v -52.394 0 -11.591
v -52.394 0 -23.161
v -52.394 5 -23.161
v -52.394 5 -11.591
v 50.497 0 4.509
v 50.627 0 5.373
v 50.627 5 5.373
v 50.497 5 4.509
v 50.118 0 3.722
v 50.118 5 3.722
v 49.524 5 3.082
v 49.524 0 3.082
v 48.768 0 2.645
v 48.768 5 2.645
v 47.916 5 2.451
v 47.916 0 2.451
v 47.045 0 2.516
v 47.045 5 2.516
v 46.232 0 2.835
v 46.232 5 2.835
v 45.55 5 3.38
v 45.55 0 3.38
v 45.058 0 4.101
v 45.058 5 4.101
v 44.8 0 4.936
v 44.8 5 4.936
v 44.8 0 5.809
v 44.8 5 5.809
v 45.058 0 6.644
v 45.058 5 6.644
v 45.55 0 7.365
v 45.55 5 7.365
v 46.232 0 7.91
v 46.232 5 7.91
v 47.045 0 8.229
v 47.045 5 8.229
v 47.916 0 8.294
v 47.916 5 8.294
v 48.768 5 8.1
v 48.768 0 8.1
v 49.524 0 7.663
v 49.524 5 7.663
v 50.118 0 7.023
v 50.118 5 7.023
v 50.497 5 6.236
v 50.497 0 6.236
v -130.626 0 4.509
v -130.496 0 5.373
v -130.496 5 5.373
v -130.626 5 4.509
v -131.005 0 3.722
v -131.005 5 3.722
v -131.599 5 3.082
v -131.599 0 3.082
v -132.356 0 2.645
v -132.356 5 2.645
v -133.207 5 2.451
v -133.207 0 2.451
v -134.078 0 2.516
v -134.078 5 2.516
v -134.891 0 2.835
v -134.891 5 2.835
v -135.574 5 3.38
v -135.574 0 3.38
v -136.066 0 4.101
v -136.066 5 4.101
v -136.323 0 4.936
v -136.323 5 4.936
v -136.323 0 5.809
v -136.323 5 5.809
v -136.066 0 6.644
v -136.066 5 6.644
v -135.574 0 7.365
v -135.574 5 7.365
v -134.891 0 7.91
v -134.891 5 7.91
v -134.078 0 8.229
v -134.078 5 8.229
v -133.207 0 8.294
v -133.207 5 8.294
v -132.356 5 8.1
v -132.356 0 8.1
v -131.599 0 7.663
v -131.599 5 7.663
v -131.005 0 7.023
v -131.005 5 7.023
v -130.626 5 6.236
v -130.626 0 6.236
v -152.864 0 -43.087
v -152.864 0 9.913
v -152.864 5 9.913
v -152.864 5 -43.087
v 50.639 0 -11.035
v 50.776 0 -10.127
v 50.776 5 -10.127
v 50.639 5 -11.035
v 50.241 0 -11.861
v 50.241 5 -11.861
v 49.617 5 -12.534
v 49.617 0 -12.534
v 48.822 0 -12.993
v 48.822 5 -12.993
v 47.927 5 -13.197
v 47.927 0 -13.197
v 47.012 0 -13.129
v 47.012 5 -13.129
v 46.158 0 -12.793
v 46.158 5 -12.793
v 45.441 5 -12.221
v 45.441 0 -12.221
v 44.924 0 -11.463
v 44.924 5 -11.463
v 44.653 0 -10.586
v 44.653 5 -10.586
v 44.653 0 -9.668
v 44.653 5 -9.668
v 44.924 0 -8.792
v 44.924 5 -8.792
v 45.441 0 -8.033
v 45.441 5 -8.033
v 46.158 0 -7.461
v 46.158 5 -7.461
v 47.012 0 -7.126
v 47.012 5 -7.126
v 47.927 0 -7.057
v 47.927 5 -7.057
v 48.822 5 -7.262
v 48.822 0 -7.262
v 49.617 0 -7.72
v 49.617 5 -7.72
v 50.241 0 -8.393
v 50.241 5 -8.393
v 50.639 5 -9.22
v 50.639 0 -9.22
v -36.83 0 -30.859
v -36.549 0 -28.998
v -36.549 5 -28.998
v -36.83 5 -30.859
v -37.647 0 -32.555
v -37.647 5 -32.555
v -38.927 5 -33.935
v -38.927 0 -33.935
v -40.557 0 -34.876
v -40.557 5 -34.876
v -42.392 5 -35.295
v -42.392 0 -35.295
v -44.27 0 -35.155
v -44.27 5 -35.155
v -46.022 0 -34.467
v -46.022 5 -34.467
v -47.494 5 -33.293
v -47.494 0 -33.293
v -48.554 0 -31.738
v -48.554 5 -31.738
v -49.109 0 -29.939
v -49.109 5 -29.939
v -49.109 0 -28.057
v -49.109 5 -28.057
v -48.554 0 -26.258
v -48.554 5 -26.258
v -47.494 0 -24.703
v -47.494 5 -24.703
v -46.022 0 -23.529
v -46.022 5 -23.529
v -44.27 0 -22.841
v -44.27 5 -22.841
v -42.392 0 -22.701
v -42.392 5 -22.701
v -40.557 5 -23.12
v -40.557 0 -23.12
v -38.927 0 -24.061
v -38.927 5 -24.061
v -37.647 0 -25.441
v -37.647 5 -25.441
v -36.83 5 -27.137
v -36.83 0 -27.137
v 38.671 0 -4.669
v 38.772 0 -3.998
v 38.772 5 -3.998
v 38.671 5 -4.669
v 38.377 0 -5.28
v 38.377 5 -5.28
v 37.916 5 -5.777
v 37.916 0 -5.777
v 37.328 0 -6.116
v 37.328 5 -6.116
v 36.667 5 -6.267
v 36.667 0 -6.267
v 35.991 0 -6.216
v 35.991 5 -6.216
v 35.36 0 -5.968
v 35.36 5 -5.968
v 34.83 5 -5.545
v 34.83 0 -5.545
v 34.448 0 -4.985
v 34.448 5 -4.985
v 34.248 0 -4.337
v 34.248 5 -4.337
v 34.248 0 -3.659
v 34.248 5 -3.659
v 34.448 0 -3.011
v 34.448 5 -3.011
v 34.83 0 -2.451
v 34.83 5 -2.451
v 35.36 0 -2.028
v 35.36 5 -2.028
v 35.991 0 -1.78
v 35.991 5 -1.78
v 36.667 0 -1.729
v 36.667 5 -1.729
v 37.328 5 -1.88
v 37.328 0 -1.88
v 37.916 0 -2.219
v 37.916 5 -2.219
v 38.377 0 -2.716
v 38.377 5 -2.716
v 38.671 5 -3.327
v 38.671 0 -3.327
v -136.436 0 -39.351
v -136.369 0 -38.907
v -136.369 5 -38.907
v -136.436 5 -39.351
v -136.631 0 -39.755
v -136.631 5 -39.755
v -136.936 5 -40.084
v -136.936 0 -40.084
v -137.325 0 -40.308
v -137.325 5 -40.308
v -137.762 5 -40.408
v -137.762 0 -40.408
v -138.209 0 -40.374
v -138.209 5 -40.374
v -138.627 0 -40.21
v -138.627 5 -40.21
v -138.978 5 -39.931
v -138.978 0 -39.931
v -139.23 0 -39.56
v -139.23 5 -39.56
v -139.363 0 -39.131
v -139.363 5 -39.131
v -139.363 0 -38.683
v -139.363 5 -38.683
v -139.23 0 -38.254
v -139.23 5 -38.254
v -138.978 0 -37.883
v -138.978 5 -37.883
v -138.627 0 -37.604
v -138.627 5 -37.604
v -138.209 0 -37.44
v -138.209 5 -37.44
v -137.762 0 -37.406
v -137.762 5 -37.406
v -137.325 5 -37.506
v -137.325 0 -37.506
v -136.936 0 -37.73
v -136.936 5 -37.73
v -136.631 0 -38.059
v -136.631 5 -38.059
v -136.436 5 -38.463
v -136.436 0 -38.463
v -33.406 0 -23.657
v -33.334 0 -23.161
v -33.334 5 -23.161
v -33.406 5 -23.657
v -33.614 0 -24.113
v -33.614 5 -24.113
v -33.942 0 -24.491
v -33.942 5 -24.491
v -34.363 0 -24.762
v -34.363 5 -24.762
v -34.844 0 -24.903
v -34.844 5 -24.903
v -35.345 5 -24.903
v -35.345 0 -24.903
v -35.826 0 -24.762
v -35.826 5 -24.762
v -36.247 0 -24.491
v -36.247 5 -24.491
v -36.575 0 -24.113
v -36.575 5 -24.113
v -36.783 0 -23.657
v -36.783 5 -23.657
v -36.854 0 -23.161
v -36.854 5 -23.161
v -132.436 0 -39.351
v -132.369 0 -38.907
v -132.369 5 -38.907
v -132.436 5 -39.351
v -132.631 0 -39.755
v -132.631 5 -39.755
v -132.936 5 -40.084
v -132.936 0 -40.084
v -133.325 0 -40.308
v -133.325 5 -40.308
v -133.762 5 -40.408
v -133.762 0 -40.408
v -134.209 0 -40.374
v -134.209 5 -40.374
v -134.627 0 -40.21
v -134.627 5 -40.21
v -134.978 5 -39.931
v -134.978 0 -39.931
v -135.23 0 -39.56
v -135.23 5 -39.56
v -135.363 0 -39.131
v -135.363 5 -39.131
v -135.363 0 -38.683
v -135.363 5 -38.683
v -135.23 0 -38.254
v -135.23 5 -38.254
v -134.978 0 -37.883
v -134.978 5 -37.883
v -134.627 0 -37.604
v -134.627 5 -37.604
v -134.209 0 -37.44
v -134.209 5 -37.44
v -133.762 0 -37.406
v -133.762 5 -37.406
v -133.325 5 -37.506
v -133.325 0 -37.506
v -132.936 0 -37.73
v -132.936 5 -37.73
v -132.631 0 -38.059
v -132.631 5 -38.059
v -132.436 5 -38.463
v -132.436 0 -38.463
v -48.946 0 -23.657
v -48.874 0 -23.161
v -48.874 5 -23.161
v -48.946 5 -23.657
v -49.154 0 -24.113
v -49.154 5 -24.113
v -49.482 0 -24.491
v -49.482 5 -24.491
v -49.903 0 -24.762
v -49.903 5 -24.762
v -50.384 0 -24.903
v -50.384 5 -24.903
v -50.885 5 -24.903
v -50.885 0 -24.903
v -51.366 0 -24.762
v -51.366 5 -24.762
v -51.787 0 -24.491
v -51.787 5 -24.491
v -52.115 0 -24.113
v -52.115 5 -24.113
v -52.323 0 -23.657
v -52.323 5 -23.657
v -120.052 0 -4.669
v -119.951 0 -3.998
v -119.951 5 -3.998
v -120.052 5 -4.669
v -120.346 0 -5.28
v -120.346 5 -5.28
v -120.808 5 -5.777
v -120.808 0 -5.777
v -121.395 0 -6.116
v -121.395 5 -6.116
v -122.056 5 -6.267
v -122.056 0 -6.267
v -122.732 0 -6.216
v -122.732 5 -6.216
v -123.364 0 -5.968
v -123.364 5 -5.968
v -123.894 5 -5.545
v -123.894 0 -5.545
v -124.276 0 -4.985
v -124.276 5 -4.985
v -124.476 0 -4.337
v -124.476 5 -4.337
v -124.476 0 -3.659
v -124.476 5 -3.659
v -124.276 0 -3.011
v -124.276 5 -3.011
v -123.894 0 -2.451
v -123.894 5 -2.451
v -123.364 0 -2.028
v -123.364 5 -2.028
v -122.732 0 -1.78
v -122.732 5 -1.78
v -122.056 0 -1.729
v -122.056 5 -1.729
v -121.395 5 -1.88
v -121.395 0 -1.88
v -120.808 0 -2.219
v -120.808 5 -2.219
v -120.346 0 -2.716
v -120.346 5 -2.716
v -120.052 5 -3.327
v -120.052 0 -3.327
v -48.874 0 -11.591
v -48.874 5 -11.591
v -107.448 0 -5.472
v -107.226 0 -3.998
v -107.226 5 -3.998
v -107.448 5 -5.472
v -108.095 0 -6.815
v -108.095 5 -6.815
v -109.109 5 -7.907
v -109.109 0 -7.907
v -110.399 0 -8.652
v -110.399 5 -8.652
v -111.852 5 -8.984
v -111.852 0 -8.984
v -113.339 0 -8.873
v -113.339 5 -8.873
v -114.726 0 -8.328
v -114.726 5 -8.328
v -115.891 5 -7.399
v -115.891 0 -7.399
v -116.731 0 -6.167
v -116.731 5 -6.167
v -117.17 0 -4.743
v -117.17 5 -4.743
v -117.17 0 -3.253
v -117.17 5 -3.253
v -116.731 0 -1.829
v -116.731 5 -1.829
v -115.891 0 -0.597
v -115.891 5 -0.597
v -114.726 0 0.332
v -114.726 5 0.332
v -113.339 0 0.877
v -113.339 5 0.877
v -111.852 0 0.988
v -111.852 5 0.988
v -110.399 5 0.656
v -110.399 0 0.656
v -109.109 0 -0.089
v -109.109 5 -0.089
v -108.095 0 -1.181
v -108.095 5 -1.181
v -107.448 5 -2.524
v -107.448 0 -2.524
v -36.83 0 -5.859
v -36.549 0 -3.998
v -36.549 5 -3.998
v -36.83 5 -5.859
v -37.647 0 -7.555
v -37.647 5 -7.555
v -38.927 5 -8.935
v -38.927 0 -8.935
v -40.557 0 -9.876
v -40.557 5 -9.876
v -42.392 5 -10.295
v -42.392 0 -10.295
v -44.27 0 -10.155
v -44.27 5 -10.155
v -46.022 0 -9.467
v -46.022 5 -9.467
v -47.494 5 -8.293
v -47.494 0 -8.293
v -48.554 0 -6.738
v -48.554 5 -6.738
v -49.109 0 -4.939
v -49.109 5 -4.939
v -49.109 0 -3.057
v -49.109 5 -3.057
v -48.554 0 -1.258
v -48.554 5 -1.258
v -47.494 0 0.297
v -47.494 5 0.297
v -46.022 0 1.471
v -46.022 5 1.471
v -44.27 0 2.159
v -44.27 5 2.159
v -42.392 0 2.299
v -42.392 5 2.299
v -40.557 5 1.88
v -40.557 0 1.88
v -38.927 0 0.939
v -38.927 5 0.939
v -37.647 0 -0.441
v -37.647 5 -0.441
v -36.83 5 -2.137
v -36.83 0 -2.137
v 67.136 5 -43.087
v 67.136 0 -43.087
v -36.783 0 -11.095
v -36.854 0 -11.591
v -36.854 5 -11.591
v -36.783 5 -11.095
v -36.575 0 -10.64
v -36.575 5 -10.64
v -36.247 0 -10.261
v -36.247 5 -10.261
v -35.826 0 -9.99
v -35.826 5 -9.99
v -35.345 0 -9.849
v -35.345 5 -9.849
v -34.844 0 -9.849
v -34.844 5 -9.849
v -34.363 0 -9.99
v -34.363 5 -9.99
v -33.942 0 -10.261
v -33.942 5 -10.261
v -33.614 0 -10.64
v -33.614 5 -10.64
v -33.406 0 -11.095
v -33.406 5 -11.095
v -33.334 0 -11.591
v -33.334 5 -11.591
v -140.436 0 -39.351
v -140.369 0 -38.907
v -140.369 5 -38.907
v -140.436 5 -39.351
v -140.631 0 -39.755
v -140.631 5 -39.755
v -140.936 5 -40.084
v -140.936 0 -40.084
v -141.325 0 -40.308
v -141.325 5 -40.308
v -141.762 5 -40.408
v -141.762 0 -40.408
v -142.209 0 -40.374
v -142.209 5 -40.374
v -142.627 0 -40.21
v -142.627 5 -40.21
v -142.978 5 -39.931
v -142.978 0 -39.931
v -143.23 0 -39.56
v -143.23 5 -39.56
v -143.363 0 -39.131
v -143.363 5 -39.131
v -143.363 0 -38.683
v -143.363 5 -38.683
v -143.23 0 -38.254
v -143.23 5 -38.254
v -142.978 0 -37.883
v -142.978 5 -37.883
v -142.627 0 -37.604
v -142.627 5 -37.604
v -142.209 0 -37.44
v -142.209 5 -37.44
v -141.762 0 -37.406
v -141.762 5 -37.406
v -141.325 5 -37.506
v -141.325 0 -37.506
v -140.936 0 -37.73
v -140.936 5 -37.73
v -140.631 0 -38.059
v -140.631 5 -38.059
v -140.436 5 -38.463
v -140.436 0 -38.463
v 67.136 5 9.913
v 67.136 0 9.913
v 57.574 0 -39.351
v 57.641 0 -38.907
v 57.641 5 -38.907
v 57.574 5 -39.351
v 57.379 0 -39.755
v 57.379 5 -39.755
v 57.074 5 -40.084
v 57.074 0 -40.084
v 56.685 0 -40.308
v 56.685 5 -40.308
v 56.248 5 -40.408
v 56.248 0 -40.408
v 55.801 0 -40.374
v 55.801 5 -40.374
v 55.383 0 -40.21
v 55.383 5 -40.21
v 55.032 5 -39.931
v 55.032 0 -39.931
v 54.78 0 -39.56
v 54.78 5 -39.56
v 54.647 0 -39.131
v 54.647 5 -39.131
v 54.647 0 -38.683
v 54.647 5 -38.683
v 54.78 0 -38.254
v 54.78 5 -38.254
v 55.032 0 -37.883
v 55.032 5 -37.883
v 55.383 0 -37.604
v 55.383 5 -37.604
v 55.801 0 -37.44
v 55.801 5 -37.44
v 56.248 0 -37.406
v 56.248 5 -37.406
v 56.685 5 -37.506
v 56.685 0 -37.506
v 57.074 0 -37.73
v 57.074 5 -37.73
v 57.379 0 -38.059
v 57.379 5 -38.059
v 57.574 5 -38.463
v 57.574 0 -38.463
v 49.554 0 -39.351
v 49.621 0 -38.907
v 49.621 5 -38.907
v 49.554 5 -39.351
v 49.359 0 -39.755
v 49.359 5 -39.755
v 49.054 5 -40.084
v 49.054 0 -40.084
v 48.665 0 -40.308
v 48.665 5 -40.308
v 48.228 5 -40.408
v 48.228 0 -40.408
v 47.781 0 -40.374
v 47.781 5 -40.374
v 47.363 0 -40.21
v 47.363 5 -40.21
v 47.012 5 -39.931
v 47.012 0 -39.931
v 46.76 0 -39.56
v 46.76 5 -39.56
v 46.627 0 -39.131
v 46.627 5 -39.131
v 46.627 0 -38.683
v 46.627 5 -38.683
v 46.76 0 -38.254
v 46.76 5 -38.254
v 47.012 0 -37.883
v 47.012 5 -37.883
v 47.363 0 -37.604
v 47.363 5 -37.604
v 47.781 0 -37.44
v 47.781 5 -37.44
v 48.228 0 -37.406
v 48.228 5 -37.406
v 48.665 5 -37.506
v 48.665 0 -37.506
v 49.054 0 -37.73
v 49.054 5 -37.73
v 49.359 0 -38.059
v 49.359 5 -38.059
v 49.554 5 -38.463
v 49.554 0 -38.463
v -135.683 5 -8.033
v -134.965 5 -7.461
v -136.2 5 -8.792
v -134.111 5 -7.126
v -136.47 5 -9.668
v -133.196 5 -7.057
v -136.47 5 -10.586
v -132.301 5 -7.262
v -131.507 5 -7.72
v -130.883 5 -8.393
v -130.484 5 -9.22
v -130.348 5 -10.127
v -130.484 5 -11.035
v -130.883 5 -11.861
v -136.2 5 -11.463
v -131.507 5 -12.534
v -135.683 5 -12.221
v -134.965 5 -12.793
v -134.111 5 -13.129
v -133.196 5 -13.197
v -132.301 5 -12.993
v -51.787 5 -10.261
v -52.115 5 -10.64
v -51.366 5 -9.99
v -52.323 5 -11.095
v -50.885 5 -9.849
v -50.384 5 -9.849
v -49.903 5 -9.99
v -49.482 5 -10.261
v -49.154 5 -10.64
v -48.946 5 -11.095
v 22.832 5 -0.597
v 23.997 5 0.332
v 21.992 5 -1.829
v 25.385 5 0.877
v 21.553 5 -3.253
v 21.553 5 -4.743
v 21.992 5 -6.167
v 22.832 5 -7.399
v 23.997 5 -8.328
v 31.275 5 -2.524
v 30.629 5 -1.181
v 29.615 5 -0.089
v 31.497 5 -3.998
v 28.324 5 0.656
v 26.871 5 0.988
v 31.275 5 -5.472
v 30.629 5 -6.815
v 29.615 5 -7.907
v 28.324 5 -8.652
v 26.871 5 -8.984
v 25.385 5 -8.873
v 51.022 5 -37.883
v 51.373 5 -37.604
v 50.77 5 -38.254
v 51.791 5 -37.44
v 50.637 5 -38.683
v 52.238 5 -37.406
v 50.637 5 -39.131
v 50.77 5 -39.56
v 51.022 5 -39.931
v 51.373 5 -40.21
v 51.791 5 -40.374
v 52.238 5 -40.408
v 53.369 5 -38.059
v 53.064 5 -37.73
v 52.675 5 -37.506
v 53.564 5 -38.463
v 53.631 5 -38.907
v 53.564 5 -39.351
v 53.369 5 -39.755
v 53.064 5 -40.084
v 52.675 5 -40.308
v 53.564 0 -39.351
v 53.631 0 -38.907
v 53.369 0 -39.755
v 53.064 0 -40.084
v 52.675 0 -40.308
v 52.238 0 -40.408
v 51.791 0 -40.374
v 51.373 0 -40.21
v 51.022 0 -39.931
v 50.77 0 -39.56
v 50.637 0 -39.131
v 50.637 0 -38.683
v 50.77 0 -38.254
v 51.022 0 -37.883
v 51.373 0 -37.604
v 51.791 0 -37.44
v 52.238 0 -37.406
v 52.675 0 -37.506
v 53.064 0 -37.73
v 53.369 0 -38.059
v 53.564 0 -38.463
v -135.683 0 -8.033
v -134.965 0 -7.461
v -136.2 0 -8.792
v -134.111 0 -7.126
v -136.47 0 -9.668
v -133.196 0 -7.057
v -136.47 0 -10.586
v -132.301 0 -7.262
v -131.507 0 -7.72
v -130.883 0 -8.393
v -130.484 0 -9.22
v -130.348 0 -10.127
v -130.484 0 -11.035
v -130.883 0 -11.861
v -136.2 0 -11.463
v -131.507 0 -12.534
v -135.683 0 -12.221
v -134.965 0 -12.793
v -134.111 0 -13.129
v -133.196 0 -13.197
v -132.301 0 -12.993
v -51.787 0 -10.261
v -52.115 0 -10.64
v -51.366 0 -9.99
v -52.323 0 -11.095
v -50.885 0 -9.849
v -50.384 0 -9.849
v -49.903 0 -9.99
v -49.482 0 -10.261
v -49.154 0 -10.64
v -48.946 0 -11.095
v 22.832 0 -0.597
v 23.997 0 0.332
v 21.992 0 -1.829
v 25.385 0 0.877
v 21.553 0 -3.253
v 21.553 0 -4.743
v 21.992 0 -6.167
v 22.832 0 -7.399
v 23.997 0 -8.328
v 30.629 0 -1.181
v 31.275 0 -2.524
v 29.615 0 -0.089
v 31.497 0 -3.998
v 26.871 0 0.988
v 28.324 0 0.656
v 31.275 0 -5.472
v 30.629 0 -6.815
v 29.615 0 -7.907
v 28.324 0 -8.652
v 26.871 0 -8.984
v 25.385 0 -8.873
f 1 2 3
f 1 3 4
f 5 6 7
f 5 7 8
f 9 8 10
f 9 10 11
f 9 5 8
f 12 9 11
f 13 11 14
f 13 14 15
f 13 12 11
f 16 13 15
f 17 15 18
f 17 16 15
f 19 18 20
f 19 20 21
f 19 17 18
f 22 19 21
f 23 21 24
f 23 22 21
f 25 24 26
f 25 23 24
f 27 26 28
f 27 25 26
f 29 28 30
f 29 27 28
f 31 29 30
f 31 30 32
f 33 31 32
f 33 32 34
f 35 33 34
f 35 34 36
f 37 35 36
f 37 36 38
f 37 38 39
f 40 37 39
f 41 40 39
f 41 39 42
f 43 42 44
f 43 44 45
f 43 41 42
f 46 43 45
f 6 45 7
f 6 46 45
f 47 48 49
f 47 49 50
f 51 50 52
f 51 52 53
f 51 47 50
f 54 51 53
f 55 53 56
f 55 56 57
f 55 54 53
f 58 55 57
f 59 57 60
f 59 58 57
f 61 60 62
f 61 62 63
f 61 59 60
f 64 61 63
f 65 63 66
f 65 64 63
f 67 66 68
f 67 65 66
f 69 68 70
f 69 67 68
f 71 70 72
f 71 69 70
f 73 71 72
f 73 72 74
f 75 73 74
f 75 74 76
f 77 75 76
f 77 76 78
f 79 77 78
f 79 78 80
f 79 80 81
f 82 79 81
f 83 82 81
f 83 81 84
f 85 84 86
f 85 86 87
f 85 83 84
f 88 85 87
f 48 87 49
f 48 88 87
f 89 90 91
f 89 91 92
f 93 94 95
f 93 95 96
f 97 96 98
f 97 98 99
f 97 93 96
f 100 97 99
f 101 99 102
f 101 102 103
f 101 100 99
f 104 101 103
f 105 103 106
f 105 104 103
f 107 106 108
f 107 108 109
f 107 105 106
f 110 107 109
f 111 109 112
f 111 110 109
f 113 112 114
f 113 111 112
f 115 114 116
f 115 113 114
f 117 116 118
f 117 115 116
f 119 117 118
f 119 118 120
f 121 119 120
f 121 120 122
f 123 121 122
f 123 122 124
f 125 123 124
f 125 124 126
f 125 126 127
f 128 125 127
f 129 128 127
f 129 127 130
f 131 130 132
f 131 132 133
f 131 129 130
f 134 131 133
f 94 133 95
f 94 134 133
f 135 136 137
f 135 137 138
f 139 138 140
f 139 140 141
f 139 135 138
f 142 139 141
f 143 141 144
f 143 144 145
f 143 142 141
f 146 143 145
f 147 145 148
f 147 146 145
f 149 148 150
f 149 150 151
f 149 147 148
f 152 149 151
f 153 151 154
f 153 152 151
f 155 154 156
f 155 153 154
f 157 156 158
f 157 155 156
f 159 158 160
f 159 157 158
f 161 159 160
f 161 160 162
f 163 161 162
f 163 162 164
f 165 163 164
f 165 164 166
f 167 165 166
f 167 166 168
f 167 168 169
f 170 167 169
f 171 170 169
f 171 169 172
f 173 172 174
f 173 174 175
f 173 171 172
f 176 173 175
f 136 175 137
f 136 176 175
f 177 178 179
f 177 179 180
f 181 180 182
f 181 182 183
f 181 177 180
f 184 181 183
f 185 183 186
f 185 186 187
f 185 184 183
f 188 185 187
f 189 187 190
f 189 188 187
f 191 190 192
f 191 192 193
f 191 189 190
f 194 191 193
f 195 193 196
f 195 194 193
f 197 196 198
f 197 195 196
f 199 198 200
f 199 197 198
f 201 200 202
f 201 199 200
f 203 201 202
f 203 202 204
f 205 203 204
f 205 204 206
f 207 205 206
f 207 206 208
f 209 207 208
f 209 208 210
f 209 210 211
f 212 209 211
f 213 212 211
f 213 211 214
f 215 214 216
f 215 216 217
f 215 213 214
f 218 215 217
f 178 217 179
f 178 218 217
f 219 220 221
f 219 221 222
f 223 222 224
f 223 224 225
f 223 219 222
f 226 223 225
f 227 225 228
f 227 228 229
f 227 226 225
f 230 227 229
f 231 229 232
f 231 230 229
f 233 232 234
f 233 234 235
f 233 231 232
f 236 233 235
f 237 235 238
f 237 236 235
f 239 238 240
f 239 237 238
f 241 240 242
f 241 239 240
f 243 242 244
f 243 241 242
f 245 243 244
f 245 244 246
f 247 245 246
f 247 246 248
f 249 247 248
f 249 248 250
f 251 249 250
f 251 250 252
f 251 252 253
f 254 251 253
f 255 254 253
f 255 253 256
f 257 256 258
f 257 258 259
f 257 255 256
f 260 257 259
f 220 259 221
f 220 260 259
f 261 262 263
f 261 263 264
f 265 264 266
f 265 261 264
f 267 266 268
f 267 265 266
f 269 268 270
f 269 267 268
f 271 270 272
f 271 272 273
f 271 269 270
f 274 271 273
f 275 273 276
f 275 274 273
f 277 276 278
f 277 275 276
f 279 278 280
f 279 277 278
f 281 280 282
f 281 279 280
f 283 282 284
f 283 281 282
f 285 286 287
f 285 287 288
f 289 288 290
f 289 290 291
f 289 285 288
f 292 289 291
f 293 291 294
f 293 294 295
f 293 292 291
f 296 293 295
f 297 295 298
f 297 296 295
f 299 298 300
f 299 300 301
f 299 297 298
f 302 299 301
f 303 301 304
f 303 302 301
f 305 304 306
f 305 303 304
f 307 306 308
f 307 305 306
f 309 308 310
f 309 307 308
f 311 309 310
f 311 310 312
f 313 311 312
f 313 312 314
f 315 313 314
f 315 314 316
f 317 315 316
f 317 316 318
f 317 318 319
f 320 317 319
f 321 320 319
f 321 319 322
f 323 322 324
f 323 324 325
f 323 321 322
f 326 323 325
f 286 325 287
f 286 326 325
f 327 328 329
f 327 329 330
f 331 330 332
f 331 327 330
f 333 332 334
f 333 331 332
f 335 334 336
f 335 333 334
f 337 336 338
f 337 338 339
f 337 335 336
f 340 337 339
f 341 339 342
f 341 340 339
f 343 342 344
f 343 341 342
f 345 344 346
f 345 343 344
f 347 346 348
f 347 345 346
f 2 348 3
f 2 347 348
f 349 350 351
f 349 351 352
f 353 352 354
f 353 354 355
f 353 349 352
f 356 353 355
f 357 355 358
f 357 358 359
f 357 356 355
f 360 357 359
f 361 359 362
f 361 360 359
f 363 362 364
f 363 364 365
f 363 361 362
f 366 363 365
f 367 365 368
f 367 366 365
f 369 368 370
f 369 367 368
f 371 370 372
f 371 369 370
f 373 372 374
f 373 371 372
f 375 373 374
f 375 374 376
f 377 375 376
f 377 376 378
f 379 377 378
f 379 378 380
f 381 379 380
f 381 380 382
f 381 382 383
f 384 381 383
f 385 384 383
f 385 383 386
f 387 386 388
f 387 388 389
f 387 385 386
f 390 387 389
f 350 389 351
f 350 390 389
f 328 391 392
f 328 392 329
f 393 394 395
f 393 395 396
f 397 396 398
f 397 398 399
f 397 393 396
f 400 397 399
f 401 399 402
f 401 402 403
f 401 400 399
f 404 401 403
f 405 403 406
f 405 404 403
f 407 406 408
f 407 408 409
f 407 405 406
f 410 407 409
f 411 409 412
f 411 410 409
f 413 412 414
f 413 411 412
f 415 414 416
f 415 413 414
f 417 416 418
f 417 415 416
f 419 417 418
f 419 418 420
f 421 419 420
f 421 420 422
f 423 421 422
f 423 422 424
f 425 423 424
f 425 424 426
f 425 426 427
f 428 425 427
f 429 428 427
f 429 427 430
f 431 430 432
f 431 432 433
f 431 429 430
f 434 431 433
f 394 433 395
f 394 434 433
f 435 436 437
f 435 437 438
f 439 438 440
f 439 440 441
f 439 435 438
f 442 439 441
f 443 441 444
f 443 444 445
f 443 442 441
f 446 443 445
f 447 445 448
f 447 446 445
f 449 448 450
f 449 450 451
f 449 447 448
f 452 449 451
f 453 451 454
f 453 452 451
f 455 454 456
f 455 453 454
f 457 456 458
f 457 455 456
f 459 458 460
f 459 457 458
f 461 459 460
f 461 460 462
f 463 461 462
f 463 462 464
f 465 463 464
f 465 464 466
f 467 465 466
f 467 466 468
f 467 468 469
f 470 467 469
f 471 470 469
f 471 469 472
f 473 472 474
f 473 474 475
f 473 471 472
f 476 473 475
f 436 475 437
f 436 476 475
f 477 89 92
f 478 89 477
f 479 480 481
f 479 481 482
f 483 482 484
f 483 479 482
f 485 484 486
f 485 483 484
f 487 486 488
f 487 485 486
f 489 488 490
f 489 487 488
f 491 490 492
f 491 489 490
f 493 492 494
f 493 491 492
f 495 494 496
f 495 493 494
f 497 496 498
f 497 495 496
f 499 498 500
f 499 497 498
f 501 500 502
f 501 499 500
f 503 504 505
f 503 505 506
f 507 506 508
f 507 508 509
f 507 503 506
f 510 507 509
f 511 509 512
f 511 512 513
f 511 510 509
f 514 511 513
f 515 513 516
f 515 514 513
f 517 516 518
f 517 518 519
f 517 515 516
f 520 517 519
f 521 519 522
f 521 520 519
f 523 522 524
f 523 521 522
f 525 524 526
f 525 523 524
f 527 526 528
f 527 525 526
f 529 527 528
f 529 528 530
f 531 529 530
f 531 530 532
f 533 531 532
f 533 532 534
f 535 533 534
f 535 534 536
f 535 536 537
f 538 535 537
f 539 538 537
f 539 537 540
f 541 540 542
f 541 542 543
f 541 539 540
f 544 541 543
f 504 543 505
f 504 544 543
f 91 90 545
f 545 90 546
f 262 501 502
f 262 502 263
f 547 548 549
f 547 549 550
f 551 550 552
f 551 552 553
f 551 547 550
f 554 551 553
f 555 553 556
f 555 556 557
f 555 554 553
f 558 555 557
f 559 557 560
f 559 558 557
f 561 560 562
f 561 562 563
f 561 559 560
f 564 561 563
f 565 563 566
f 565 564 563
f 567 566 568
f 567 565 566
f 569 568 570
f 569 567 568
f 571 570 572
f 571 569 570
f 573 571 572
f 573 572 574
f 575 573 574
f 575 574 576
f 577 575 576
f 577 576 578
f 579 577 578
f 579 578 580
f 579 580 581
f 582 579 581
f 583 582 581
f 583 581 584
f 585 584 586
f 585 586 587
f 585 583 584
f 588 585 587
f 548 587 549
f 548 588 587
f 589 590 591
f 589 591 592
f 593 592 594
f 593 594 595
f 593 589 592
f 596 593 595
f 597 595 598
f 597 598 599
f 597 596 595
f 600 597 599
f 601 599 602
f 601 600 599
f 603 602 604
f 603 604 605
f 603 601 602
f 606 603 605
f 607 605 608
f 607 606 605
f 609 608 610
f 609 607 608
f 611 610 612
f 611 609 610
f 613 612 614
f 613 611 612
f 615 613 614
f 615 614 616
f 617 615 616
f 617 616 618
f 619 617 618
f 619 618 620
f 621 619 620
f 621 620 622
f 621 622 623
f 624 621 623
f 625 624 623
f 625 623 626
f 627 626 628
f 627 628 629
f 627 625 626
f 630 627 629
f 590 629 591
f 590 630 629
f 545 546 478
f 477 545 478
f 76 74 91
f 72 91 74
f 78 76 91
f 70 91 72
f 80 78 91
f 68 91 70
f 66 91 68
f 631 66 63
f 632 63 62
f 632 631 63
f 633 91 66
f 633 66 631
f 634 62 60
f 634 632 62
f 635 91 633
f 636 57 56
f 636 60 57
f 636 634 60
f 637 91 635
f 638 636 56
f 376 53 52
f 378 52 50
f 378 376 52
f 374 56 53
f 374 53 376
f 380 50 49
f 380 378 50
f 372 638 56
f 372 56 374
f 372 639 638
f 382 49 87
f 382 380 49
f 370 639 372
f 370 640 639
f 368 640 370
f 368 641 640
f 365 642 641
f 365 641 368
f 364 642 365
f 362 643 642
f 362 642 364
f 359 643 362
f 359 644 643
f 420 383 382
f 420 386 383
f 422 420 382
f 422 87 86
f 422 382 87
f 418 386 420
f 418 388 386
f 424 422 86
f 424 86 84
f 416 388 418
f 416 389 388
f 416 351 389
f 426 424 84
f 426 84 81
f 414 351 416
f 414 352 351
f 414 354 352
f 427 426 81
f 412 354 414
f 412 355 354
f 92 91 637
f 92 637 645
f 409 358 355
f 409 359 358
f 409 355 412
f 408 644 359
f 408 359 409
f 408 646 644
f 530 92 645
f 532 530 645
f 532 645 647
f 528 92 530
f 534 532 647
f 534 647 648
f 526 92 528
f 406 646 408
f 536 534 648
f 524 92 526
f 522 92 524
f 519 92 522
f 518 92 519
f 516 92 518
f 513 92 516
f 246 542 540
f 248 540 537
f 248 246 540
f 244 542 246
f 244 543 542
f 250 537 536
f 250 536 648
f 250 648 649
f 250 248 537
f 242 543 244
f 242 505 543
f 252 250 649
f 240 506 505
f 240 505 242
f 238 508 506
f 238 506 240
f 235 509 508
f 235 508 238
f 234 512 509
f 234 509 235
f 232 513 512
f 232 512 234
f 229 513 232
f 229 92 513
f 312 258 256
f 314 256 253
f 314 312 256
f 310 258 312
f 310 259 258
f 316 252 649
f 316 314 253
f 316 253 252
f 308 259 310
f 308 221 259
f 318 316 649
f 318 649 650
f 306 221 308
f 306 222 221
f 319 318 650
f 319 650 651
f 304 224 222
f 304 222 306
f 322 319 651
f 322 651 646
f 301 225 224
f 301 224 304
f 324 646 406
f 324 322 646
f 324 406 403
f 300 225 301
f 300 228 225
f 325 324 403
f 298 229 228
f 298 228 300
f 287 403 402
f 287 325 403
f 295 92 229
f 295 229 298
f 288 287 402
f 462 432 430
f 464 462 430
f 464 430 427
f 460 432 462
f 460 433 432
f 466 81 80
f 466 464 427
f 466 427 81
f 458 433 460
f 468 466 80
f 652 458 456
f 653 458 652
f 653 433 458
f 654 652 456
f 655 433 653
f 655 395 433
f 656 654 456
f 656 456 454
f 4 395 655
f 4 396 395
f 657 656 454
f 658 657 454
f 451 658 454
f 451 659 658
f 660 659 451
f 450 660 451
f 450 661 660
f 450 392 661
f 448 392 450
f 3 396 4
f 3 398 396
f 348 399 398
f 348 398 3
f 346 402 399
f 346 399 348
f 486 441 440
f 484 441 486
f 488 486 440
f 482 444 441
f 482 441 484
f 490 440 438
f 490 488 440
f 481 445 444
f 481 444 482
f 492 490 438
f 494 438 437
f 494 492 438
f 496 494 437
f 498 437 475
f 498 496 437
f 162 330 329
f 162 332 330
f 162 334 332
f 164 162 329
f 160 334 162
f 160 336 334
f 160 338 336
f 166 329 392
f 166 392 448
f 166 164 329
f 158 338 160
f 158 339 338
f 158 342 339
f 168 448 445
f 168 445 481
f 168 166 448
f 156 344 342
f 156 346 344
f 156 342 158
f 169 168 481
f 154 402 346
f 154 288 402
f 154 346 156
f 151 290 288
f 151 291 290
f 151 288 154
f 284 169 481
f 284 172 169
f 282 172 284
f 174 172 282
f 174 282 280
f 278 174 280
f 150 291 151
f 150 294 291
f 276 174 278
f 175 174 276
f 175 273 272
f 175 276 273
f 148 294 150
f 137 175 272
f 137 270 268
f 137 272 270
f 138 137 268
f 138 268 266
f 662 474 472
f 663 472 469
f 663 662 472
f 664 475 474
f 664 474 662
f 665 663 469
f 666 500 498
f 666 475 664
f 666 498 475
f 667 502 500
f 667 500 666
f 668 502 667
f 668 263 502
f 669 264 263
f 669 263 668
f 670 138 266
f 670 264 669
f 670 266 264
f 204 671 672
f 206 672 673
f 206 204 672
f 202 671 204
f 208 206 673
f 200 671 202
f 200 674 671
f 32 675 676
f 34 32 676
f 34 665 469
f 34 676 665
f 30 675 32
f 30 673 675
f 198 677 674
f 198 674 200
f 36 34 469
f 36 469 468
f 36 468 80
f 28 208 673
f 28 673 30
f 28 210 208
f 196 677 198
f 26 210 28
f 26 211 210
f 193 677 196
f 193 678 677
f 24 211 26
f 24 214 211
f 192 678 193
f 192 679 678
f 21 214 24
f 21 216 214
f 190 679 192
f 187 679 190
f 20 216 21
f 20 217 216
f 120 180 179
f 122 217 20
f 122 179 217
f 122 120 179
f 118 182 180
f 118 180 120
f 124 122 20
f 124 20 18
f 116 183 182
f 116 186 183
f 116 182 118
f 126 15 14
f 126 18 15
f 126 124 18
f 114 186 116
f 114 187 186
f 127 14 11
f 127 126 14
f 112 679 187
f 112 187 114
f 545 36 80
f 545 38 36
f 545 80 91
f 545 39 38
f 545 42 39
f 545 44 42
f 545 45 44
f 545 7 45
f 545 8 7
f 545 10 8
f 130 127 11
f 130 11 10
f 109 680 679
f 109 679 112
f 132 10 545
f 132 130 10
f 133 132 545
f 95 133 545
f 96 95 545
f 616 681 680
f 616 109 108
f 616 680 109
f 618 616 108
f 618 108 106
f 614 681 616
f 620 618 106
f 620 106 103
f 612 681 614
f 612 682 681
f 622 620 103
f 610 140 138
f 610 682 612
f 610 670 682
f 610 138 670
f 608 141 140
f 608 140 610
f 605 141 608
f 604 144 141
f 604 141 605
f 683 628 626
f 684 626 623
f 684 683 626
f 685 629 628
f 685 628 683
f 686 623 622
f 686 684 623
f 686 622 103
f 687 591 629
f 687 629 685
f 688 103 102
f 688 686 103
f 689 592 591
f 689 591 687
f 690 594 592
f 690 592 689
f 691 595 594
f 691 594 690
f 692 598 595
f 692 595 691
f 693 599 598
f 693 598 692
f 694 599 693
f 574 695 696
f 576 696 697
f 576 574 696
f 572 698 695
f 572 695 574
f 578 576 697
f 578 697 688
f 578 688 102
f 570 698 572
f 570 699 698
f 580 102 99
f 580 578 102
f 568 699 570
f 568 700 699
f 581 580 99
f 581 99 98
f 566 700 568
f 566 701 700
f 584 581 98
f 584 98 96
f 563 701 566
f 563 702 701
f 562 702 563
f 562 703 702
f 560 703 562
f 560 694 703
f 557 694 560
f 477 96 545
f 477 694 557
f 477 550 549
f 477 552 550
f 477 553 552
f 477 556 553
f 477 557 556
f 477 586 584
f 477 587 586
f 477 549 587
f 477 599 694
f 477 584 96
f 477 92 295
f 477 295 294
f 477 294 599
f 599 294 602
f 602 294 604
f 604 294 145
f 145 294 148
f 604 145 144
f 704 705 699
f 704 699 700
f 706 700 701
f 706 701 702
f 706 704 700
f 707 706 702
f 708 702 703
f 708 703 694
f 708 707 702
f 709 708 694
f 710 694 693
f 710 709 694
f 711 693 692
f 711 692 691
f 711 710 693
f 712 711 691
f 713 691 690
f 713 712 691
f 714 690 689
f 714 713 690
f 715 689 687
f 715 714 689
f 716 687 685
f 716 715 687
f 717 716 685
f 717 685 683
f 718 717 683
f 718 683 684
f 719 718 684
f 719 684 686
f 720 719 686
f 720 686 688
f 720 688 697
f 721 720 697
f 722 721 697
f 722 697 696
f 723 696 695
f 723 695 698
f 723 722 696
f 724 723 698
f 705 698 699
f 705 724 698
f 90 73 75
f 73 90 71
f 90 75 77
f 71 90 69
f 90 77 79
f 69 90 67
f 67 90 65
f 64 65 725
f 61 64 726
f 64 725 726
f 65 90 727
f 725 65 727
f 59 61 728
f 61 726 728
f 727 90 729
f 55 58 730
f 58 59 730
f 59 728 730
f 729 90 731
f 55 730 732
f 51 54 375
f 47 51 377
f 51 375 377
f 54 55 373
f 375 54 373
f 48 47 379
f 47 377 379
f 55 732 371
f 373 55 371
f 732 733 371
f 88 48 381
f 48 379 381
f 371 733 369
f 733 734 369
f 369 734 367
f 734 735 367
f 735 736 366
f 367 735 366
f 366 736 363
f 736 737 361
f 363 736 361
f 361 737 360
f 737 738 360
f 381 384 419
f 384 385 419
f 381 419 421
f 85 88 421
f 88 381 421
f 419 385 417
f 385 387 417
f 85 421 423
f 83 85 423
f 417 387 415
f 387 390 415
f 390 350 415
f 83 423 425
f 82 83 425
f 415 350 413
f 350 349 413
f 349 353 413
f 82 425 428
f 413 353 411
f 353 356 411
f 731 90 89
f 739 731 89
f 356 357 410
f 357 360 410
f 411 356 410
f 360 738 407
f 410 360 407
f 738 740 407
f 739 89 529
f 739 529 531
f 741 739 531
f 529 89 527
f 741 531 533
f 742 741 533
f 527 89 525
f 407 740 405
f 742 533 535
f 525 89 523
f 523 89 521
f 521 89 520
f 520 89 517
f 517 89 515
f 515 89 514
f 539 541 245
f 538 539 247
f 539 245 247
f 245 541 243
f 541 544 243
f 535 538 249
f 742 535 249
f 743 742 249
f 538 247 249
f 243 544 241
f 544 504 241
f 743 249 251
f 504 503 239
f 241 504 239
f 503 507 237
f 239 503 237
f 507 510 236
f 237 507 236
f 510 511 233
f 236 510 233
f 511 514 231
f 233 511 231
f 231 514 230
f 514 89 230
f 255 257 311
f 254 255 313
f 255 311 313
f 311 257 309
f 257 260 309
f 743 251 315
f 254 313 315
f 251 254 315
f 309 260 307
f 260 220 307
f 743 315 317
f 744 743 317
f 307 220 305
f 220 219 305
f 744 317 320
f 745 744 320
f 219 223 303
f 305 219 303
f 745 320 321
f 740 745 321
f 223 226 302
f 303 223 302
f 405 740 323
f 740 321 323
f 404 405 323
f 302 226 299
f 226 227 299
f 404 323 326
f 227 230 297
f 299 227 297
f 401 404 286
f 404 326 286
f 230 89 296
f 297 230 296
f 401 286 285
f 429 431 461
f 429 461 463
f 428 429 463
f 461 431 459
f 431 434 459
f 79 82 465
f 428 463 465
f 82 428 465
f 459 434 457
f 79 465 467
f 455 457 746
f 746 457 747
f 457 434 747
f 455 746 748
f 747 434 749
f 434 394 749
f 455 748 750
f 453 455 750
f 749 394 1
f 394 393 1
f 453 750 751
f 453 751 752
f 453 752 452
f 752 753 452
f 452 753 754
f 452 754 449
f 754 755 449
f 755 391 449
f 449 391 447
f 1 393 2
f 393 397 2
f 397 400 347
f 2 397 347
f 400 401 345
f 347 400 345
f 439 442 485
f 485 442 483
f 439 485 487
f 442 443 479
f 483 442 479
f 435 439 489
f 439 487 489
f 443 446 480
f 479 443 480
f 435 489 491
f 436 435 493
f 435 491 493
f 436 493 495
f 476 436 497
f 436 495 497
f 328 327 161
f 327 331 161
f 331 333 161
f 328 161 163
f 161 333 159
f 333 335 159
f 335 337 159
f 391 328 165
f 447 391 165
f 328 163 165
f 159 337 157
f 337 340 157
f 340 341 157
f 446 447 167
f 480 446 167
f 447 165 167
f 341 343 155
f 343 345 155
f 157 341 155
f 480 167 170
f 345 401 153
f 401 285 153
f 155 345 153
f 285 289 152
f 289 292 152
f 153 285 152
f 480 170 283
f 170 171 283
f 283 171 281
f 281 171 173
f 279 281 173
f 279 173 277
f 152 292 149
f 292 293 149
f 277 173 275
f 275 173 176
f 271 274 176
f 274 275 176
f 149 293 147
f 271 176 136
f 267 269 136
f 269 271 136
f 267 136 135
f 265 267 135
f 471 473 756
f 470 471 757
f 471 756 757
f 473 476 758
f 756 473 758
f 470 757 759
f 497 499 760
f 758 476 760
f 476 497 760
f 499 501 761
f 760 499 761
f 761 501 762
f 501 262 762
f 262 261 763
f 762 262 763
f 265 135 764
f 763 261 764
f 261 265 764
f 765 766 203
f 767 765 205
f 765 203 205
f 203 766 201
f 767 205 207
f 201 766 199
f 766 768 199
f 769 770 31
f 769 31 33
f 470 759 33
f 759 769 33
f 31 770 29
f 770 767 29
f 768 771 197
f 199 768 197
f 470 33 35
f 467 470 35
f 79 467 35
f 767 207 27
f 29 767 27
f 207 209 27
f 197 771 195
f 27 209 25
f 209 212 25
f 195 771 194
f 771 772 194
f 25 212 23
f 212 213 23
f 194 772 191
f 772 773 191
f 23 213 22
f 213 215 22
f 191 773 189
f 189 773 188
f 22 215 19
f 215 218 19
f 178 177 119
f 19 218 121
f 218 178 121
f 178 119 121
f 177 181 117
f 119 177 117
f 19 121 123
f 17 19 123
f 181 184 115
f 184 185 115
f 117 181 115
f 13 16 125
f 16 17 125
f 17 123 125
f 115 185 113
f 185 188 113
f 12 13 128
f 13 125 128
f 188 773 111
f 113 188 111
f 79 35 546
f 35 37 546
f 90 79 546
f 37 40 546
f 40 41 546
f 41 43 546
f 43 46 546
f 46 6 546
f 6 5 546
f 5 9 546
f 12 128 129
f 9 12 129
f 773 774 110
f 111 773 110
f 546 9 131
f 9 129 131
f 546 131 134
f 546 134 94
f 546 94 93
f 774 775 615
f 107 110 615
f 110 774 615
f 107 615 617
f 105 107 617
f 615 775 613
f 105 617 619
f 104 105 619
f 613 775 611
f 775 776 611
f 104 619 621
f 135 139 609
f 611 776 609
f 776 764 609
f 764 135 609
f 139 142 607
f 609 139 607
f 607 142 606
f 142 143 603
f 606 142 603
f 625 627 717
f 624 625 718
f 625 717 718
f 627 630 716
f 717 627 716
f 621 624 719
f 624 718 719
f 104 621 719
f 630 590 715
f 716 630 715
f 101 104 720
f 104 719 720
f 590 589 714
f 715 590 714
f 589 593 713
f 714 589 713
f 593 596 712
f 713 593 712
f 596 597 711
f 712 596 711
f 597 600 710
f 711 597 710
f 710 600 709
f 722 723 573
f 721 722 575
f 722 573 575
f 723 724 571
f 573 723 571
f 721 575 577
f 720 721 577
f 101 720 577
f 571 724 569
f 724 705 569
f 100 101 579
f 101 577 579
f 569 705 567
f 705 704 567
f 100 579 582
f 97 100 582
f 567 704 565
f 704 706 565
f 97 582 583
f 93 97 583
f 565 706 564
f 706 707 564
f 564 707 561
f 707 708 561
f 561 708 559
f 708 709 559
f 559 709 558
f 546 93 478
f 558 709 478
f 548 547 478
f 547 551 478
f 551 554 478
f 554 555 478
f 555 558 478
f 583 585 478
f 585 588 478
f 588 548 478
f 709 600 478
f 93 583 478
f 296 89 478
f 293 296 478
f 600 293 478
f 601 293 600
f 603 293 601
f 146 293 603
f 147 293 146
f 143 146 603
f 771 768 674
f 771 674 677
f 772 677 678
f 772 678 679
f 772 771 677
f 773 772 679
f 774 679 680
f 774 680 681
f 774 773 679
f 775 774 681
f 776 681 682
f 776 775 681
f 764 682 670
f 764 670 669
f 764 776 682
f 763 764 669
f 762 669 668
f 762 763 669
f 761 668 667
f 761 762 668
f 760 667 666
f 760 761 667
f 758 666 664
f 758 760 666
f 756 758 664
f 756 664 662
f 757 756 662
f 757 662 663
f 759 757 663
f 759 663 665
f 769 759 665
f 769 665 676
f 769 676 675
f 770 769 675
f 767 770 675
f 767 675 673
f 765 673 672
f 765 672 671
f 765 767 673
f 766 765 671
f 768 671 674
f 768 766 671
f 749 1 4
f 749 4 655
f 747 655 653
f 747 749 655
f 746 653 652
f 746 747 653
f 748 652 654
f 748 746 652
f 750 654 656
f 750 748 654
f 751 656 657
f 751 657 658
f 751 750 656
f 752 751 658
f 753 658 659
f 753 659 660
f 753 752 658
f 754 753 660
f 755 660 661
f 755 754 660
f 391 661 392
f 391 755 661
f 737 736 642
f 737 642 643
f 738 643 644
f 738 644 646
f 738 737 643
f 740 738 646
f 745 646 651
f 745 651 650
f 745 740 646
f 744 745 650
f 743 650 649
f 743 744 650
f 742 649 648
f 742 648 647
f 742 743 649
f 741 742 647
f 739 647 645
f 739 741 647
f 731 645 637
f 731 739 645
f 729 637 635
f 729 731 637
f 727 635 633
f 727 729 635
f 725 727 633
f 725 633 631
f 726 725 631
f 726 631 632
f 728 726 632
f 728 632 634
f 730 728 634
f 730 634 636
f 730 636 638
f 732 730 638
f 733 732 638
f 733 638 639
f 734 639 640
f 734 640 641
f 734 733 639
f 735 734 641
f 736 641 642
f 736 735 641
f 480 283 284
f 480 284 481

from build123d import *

# Parameters (mm, degrees)
SKETCH1_W           = 220
SKETCH1_H           = 53
SKETCH1_R           = 1.505
SKETCH1_R_2         = 6.315
SKETCH1_R_3         = 3.078429052
SKETCH1_R_4         = 2.929841002
SKETCH1_R_5         = 2.275
SKETCH1_R_6         = 5
BOSS_EXTRUDE1_DEPTH = 5


with BuildPart() as part:
    # Sketch1 → Boss-Extrude1 (new body)
    with BuildSketch(Plane(origin=(0, 0, 0), x_dir=(1, 0, 0), z_dir=(0, 1, 0))):
        with Locations((-42.86437247, 16.587044534)):
            Rectangle(SKETCH1_W, SKETCH1_H)
        with Locations((56.13562753, 38.907044534)):
            Circle(SKETCH1_R, mode=Mode.SUBTRACT)
        with Locations((52.12562753, 38.907044534)):
            Circle(SKETCH1_R, mode=Mode.SUBTRACT)
        with Locations((48.11562753, 38.907044534)):
            Circle(SKETCH1_R, mode=Mode.SUBTRACT)
        with Locations((-141.87437247, 38.907044534)):
            Circle(SKETCH1_R, mode=Mode.SUBTRACT)
        with Locations((-137.87437247, 38.907044534)):
            Circle(SKETCH1_R, mode=Mode.SUBTRACT)
        with Locations((-133.87437247, 38.907044534)):
            Circle(SKETCH1_R, mode=Mode.SUBTRACT)
        with Locations((-42.86437247, 28.997993636)):
            Circle(SKETCH1_R_2, mode=Mode.SUBTRACT)
        with Locations((-42.86437247, 3.997993636)):
            Circle(SKETCH1_R_2, mode=Mode.SUBTRACT)
        with Locations((47.6973107, 10.127310686)):
            Circle(SKETCH1_R_3, mode=Mode.SUBTRACT)
        with Locations((47.6973107, -5.372689314)):
            Circle(SKETCH1_R_4, mode=Mode.SUBTRACT)
        with Locations((36.4973107, 3.997993636)):
            Circle(SKETCH1_R_5, mode=Mode.SUBTRACT)
        with Locations((26.4973107, 3.997993636)):
            Circle(SKETCH1_R_6, mode=Mode.SUBTRACT)
        with Locations((-133.426055639, -5.372689314)):
            Circle(SKETCH1_R_4, mode=Mode.SUBTRACT)
        with Locations((-133.426055639, 10.127310686)):
            Circle(SKETCH1_R_3, mode=Mode.SUBTRACT)
        with Locations((-122.226055639, 3.997993636)):
            Circle(SKETCH1_R_5, mode=Mode.SUBTRACT)
        with Locations((-112.226055639, 3.997993636)):
            Circle(SKETCH1_R_6, mode=Mode.SUBTRACT)
        with BuildLine():
            Line((-52.39437247, 23.161197849), (-52.39437247, 11.591197849))
            ThreePointArc((-52.39437247, 11.591197849), (-50.63437247, 9.831197849), (-48.87437247, 11.591197849))
            Line((-48.87437247, 11.591197849), (-48.87437247, 23.161197849))
            ThreePointArc((-48.87437247, 23.161197849), (-50.63437247, 24.921197849), (-52.39437247, 23.161197849))
        make_face(mode=Mode.SUBTRACT)
        with BuildLine():
            Line((-36.85437247, 23.161197849), (-36.85437247, 11.591197849))
            ThreePointArc((-36.85437247, 11.591197849), (-35.09437247, 9.831197849), (-33.33437247, 11.591197849))
            Line((-33.33437247, 11.591197849), (-33.33437247, 23.161197849))
            ThreePointArc((-33.33437247, 23.161197849), (-35.09437247, 24.921197849), (-36.85437247, 23.161197849))
        make_face(mode=Mode.SUBTRACT)
    extrude(amount=BOSS_EXTRUDE1_DEPTH)


solid = part.part
